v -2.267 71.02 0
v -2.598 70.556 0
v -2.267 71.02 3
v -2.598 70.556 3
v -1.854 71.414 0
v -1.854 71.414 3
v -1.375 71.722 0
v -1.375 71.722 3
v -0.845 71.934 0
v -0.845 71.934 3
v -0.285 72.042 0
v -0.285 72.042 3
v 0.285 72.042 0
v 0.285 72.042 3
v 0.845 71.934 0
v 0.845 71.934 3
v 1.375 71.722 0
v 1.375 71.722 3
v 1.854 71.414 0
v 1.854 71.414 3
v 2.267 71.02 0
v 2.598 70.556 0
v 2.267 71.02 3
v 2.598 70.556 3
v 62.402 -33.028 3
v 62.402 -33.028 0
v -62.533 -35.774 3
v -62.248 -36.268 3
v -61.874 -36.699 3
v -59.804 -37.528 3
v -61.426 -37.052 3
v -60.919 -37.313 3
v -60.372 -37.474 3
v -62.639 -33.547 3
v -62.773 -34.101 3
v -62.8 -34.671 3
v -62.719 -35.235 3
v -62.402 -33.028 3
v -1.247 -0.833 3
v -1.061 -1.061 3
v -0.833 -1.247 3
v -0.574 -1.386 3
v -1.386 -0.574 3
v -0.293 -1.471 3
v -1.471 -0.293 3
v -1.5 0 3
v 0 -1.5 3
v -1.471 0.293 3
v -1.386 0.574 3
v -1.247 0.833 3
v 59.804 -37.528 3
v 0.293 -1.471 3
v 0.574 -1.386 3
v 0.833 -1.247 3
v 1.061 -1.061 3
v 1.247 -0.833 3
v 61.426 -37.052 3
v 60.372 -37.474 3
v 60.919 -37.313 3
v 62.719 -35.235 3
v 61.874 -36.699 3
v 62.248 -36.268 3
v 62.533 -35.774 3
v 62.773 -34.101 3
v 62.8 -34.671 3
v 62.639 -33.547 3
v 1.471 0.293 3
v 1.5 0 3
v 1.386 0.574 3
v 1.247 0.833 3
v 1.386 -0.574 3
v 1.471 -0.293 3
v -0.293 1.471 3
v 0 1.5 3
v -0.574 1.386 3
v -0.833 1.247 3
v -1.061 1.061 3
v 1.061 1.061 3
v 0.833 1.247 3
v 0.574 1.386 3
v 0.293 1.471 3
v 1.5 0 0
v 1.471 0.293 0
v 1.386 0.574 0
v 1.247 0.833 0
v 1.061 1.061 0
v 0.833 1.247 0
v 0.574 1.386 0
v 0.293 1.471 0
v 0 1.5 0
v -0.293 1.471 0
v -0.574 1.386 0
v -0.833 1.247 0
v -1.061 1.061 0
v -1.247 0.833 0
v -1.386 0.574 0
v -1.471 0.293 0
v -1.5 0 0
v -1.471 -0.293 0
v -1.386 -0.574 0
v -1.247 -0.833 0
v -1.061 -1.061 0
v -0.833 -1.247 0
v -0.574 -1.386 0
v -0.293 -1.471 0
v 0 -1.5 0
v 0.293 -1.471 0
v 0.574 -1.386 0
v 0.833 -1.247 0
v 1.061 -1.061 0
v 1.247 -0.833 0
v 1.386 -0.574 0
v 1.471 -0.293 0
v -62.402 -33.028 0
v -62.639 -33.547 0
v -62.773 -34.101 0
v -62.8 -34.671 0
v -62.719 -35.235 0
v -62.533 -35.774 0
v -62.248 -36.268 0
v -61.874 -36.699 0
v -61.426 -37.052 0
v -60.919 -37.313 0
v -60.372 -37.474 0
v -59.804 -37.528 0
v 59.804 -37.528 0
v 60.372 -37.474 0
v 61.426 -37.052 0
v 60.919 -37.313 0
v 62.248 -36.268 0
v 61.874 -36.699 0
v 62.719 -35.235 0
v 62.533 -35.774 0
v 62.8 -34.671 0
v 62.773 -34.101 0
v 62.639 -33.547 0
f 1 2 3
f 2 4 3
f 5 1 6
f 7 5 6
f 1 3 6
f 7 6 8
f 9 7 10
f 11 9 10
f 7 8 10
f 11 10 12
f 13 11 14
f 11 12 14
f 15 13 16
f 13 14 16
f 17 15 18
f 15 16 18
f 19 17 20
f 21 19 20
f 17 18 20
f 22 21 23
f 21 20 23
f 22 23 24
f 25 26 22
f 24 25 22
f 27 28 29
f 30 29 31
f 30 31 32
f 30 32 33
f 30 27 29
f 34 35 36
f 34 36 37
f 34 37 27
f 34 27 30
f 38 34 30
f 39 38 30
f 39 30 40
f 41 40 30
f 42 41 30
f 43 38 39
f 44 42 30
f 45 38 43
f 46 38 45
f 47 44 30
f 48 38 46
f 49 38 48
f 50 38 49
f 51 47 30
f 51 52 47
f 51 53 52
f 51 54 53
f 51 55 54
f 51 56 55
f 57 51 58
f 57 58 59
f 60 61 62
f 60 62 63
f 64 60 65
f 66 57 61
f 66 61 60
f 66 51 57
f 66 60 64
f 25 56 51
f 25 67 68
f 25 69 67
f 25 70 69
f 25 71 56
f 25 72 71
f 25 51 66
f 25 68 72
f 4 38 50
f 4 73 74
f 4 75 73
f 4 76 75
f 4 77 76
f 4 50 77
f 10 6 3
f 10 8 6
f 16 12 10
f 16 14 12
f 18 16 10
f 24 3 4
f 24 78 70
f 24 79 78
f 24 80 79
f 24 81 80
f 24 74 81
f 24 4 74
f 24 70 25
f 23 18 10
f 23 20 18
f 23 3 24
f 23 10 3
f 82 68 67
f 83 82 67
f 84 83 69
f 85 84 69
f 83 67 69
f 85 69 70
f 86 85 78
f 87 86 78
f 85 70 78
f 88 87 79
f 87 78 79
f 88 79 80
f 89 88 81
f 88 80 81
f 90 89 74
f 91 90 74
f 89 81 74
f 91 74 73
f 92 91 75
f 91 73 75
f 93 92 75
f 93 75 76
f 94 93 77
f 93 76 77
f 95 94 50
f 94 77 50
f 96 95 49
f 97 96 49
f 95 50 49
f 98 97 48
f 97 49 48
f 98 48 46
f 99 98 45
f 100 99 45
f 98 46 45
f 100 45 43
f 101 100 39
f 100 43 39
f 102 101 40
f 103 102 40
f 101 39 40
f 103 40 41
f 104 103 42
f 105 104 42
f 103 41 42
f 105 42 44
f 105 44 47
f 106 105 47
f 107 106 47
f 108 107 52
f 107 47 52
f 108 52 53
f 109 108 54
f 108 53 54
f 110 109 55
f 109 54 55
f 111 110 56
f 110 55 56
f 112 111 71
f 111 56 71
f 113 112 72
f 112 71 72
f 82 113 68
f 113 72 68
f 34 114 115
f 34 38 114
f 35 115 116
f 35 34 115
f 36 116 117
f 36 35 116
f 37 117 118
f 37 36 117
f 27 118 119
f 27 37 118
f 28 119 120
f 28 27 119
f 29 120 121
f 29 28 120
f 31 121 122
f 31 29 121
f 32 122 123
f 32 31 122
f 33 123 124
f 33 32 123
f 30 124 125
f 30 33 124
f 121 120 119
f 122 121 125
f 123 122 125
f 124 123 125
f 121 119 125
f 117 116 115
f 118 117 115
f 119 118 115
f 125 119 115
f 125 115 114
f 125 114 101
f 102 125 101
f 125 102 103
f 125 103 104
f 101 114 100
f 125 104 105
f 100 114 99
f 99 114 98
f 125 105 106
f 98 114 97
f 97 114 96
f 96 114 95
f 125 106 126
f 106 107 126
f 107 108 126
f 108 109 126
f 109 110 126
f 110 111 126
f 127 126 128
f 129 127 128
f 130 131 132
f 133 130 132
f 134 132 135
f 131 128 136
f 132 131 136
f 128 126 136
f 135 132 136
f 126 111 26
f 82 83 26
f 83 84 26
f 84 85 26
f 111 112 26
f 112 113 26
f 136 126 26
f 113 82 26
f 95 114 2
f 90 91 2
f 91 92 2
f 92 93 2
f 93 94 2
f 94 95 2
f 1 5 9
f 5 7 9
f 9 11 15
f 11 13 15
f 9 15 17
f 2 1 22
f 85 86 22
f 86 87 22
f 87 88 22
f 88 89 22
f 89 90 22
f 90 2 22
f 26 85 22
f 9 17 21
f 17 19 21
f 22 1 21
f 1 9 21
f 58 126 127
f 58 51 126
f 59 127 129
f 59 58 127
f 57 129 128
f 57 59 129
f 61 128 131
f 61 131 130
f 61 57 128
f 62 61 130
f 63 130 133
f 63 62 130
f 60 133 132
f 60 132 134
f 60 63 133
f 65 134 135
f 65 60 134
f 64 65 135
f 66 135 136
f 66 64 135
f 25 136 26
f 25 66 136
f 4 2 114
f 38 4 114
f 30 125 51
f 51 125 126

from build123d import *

# Parameters (mm, degrees)
F1_DEPTH = 3
F2_R     = 3
F3_R     = 1.5
F4_DEPTH = 3


with BuildPart() as f1:
    # F0 (on Top) → F1 (new body)
    with BuildSketch(Plane.XY):
        Polygon((0, 75.055535), (-65, -37.527767), (65, -37.527767), align=None)
    extrude(amount=F1_DEPTH)

    # F2
    f2_edges = [f1.edges().sort_by_distance(p)[0] for p in [
        (-65, -37.527767, 1.5),
        (65, -37.527767, 1.5),
        (0, 75.055535, 1.5),
    ]]
    fillet(f2_edges, radius=F2_R)

    # F3 (on face) → F4 (cut, through all)
    with BuildSketch(Plane.XY.offset(3)):
        Circle(F3_R)
    extrude(amount=-F4_DEPTH, mode=Mode.SUBTRACT)


solid = f1.part
